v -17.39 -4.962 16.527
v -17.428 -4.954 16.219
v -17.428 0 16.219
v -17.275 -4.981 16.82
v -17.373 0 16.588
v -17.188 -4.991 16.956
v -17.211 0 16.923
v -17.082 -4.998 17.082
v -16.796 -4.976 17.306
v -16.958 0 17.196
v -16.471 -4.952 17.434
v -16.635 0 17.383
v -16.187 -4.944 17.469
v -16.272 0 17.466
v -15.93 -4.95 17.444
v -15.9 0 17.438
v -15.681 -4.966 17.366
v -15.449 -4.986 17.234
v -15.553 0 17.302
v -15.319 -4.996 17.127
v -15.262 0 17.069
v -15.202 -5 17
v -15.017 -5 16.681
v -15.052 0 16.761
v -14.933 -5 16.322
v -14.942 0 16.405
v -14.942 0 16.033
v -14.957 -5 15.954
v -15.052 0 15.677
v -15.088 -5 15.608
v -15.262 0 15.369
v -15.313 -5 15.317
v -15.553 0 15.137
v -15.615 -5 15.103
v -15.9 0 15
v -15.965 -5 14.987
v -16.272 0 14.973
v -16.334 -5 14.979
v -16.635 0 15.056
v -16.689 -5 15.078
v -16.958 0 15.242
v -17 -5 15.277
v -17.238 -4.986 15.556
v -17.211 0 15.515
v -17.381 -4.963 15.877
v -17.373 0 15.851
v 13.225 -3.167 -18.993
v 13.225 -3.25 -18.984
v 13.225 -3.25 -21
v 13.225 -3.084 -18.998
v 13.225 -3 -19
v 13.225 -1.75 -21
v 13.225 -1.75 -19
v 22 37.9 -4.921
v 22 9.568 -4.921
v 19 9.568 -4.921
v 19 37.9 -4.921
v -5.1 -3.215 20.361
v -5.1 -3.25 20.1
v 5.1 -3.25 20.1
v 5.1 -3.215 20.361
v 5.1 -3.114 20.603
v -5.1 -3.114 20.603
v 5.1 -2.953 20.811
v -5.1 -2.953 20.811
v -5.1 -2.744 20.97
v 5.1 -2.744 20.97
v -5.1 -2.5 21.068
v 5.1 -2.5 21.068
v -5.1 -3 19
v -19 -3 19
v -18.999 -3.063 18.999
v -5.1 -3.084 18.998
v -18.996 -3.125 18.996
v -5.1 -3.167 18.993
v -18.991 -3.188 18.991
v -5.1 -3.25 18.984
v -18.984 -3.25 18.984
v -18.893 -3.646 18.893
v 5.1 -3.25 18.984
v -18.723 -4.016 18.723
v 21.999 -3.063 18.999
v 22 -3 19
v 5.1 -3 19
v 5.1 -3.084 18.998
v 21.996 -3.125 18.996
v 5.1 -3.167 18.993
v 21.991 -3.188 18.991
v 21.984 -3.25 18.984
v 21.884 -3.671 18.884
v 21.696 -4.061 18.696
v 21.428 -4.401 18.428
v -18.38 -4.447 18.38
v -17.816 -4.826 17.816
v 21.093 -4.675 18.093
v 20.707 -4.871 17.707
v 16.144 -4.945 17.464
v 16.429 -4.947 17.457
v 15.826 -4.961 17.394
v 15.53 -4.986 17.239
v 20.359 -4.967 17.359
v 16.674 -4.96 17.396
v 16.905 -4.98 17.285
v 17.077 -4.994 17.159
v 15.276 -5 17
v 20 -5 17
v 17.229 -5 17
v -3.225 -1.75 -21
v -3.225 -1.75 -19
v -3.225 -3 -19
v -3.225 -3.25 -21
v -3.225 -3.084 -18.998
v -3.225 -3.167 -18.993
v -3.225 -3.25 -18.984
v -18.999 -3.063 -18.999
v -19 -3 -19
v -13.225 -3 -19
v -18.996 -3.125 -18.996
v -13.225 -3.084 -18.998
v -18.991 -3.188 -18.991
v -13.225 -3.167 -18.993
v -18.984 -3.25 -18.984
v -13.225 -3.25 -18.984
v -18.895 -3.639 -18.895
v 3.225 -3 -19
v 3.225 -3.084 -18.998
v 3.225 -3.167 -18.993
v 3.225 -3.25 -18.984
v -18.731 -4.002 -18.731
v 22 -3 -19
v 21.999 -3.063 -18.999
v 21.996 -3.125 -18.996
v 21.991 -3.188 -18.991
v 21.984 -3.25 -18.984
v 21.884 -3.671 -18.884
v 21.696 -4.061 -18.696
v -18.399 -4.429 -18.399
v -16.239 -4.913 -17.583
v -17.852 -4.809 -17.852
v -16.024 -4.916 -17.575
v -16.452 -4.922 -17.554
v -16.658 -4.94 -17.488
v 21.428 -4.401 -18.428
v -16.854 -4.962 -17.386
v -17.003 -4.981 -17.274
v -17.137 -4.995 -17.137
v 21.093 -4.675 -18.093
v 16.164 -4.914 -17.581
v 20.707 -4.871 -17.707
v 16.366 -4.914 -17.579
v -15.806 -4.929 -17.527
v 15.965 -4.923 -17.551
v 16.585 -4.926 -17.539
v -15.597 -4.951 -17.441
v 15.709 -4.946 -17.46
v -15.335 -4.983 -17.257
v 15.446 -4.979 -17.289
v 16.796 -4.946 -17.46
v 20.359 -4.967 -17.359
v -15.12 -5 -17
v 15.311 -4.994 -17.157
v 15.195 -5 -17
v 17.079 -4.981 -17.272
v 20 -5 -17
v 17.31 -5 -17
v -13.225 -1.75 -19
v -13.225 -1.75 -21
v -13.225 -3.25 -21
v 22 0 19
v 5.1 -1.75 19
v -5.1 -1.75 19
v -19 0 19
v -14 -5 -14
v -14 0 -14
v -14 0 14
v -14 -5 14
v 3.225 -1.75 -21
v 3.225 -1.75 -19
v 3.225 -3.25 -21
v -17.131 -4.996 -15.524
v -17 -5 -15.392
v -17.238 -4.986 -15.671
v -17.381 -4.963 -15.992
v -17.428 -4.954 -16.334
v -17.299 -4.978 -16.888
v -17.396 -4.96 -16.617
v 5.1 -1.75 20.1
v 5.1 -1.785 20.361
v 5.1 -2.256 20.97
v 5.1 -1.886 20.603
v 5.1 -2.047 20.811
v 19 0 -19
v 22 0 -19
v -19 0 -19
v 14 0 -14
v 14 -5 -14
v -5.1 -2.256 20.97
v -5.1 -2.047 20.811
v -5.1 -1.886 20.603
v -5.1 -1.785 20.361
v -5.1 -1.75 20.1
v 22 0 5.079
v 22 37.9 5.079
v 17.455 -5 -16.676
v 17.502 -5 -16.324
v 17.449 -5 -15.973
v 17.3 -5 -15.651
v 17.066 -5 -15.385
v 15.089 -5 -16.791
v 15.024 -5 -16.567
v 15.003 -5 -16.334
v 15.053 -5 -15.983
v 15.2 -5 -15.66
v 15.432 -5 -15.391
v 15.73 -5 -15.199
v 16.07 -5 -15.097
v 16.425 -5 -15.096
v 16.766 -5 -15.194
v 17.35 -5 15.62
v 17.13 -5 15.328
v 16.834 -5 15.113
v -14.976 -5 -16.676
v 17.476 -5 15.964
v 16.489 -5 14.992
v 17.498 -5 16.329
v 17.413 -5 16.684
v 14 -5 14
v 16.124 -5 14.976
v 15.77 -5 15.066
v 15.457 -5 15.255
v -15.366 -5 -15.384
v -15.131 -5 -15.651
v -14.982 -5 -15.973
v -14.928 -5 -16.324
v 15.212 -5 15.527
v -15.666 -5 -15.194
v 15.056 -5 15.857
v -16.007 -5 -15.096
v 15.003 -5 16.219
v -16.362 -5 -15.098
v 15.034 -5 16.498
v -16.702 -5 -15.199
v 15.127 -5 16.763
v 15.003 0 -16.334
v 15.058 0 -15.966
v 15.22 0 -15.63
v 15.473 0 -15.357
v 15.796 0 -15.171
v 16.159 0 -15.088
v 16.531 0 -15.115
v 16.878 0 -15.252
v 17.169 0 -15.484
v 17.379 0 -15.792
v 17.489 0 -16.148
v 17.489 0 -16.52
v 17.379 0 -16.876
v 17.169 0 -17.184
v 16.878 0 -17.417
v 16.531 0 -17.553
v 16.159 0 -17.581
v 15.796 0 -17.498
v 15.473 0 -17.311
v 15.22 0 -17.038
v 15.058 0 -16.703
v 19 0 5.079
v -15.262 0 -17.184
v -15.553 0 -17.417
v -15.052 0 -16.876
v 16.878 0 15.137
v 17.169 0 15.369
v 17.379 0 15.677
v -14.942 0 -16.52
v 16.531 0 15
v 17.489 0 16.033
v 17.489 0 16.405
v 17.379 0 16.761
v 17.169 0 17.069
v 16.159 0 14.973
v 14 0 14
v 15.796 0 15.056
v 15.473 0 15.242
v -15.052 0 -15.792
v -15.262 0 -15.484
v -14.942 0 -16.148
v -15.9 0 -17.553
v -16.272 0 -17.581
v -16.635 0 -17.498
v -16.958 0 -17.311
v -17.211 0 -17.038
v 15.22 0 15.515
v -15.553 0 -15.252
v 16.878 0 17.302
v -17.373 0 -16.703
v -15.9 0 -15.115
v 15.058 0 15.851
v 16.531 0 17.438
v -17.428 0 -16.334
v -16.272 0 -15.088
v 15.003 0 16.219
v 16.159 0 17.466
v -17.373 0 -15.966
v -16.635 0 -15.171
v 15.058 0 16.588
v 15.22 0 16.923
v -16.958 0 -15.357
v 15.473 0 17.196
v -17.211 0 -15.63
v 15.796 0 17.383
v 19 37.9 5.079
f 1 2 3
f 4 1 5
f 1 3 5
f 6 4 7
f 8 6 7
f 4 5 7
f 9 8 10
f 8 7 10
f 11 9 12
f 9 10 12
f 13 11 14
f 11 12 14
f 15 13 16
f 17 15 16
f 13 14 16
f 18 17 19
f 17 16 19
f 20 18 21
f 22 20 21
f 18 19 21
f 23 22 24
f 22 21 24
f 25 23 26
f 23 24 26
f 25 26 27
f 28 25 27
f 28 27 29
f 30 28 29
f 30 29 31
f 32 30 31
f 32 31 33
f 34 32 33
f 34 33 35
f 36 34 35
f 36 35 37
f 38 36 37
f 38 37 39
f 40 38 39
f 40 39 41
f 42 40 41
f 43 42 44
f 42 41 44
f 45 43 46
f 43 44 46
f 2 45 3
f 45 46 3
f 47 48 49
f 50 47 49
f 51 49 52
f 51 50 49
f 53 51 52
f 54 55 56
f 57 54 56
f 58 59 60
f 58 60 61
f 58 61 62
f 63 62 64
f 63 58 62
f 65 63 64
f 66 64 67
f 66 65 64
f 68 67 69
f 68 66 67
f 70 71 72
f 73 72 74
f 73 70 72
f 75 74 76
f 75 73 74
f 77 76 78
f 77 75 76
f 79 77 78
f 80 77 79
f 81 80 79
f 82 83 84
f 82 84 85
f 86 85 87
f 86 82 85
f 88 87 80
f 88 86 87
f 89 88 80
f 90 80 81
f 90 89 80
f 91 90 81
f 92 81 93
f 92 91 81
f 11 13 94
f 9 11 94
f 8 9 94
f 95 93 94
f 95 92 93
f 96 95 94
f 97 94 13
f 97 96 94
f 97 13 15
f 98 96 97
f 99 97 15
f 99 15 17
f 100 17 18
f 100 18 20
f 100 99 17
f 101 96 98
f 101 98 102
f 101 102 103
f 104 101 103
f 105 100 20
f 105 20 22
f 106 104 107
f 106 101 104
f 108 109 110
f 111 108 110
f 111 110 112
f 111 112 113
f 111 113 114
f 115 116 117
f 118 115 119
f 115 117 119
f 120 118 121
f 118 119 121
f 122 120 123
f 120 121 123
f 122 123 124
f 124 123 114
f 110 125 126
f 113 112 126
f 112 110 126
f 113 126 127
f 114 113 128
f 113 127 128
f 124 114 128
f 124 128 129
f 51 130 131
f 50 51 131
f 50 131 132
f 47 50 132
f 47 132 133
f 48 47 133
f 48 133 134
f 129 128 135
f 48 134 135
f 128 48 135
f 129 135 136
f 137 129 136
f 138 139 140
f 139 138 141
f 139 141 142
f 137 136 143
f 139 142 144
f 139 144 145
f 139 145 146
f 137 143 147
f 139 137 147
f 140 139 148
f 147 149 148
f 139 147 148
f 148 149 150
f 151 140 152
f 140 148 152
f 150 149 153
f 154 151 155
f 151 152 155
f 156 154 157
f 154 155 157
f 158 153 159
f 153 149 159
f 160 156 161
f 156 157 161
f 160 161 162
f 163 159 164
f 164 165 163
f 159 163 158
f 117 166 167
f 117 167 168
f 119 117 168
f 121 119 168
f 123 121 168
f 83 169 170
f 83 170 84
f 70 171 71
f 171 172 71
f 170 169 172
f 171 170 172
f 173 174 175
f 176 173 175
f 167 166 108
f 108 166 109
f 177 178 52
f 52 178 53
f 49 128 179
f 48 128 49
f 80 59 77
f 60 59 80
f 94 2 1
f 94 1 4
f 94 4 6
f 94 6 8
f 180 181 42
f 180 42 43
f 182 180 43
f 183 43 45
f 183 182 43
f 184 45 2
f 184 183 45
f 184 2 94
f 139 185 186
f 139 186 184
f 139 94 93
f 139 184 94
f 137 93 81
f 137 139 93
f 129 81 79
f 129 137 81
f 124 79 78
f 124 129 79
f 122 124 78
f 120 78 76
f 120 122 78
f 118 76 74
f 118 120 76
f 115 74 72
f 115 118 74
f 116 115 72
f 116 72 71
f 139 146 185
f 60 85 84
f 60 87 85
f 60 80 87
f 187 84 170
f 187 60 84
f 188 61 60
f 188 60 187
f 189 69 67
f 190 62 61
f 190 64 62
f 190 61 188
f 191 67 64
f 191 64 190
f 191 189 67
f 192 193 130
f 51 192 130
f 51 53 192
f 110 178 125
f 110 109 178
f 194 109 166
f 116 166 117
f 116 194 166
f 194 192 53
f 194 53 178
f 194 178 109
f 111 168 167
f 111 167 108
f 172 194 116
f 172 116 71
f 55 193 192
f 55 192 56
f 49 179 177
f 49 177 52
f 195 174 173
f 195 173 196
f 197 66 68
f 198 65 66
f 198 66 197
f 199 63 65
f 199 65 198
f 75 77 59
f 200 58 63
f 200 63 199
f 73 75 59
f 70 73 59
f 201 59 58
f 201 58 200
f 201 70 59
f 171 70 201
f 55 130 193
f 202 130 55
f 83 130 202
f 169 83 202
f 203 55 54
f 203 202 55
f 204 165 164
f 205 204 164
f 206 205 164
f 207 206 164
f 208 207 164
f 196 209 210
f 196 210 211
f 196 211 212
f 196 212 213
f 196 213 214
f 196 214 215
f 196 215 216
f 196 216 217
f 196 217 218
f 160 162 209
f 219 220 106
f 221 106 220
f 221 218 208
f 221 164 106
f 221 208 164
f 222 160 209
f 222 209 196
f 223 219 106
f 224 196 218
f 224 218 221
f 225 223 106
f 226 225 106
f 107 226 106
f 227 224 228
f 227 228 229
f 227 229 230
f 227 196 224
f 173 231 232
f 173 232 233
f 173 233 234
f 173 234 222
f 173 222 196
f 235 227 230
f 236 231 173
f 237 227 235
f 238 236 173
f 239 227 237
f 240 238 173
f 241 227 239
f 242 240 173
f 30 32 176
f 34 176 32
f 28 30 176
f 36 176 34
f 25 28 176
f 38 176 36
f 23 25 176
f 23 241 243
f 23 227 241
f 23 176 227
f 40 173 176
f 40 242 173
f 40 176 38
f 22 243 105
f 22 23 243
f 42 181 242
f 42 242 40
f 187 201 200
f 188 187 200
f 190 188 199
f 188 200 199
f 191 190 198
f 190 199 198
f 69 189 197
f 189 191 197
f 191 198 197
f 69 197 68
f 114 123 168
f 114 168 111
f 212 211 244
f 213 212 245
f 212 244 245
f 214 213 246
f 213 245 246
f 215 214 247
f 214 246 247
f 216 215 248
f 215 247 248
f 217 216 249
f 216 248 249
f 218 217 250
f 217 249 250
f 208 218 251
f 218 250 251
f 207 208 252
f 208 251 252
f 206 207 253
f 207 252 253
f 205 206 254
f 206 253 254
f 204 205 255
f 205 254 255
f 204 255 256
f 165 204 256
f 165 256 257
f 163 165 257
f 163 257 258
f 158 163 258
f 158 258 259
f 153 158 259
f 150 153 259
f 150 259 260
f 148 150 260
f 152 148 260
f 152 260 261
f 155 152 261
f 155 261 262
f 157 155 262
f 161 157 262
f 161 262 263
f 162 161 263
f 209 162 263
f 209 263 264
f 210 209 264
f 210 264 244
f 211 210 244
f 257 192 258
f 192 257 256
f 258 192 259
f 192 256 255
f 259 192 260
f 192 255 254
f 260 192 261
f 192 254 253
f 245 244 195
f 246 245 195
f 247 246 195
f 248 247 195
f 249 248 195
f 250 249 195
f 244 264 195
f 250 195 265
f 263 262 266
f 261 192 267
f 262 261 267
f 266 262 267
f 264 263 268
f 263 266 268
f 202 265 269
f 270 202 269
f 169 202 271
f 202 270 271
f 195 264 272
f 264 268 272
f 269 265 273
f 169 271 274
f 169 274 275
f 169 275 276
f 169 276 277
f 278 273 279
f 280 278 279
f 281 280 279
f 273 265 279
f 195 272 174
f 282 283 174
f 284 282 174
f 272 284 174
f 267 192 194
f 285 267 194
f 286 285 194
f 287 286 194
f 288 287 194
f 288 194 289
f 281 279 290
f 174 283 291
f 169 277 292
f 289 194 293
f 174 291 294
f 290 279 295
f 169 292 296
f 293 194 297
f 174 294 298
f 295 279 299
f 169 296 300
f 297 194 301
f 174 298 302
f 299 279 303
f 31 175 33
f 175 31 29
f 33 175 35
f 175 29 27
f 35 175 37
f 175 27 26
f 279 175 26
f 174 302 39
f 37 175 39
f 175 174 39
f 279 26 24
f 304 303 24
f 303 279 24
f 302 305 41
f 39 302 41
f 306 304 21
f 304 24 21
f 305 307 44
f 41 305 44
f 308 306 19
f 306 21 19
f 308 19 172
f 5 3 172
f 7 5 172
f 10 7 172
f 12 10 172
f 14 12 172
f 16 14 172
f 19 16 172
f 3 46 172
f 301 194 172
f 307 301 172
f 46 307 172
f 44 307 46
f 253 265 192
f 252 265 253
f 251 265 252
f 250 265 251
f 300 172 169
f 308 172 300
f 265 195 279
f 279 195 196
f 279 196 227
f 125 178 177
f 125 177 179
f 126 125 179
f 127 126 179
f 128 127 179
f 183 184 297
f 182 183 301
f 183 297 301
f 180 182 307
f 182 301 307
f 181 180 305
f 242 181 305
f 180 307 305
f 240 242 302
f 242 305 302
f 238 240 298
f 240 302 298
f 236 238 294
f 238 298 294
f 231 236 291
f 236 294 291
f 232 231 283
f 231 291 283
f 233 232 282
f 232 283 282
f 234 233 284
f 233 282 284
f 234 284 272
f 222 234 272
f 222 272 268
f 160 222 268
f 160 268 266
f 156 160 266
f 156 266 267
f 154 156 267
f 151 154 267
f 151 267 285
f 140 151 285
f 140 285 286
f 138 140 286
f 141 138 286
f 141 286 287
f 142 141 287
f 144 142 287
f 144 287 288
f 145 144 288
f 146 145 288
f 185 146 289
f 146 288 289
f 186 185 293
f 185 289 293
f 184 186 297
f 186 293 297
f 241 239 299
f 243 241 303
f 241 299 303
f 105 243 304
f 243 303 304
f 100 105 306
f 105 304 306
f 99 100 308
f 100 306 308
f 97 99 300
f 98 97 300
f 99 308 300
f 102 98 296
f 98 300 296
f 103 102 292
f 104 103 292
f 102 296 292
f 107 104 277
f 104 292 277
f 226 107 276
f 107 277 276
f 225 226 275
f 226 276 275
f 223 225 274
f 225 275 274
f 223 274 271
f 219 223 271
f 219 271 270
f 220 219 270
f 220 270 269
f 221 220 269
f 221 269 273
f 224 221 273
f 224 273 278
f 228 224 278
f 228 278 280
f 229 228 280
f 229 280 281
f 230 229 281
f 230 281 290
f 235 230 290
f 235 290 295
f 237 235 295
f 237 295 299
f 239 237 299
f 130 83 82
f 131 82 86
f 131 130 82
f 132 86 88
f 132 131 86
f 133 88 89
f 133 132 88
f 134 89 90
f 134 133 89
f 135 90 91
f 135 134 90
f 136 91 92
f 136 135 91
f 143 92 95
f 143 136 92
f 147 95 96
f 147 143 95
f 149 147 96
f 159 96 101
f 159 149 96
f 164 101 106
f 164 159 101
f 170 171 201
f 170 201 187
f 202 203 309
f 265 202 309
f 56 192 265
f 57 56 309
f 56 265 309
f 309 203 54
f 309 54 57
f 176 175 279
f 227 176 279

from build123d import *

# Parameters (mm, degrees)
F0_W          = 38
F0_H          = 38
F0_W_2        = 28
F0_H_2        = 28
F1_DEPTH      = 5
F2_W          = 10.2
F2_H          = 1.5
F3_DEPTH      = 2.1
F4_T1_DEPTH   = 15.2
F5_W          = 10
F5_H          = 1.5
F6_DEPTH      = 2
F8_D          = 2.5
F9_DEPTH      = 3
F10_W         = 3
F10_H         = 10
F11_DEPTH     = 37.9
F13_DEPTH     = 3
F14_T1_DEPTH  = 48
F14_T6_DEPTH  = 51
F14_T11_DEPTH = 51
F14_T16_DEPTH = 51
F14_T21_DEPTH = 51
F14_T26_DEPTH = 51
F14_T31_DEPTH = 51
F14_T37_DEPTH = 51


# Not quite as in the source:
# - a fillet or chamfer that OpenCascade refuses, or shapes differently, is made with other operations: its cross-section is extruded or revolved along the edge and cut away or added


with BuildPart() as f1:
    # F0 (on Front) → F1 (new body)
    with BuildSketch(Plane.XZ):
        Rectangle(F0_W, F0_H)
        Rectangle(F0_W_2, F0_H_2, mode=Mode.SUBTRACT)
    extrude(amount=F1_DEPTH)

    # F2 (on face) → F3 (join)
    with BuildSketch(Plane.XY.offset(19)):
        with Locations((0, -2.5)):
            Rectangle(F2_W, F2_H)
    extrude(amount=F3_DEPTH)

    # F4: fillet of radius 1 on 2 edges, made by hand

    # F4_s2 → F4_t1 (cut)
    with BuildSketch(Plane.YZ.offset(-7.6)):
        with BuildLine():
            ThreePointArc((-3.25, 20.1), (-2.9571067812, 20.8071067812), (-2.25, 21.1))
            Line((-2.25, 21.1), (-3.25, 21.1))
            Line((-3.25, 21.1), (-3.25, 20.1))
        make_face()
        with BuildLine():
            ThreePointArc((-1.75, 20.1), (-2.0428932188, 20.8071067812), (-2.75, 21.1))
            Line((-2.75, 21.1), (-1.75, 21.1))
            Line((-1.75, 21.1), (-1.75, 20.1))
        make_face()
    extrude(amount=F4_T1_DEPTH, mode=Mode.SUBTRACT)

    # F5 (on face) → F6 (join)
    with BuildSketch(Plane(origin=(0, 0, -19), x_dir=(1, 0, 0), z_dir=(0, 0, -1))):
        with Locations((-8.225, 2.5)):
            Rectangle(F5_W, F5_H)
        with Locations((8.225, 2.5)):
            Rectangle(F5_W, F5_H)
    extrude(amount=F6_DEPTH)

    # F8 (through all)
    with Locations(Plane.XZ.offset(5)):
        with Locations((16.2525195628, 16.2191219109), (-16.1783080548, 16.2191219109), (-16.1783080548, -16.3340959698), (16.2525195628, -16.3340959698)):
            Hole(F8_D / 2)

    # F9 (add): a face of the model
    f9_faces = [f1.faces().sort_by_distance(p)[0] for p in [
        (19, -2.5, 0),
    ]]
    extrude(f9_faces, amount=F9_DEPTH)

    # F10 (on face) → F11 (join)
    with BuildSketch(Plane(origin=(0, 0, 0), x_dir=(-1, 0, 0), z_dir=(0, 1, 0))):
        with Locations((-20.5, 0.0792577478)):
            Rectangle(F10_W, F10_H)
    extrude(amount=F11_DEPTH)

    # F12 (on face) → F13 (join, through all)
    with BuildSketch(Plane.YZ.offset(22)):
        Polygon((0, -4.9207422522), (0, -19), (9.5675168559, -4.9207422522), align=None)
    extrude(amount=-F13_DEPTH)

    # F14: fillet of radius 2 on 4 edges, made by hand

    # F14_s2 → F14_t1 (cut)
    with BuildSketch(Plane.XY.offset(-24)):
        with BuildLine():
            ThreePointArc((22, -3), (21.4142135624, -4.4142135624), (20, -5))
            Line((20, -5), (22, -5))
            Line((22, -5), (22, -3))
        make_face()
        with BuildLine():
            ThreePointArc((-17, -5), (-18.4142135624, -4.4142135624), (-19, -3))
            Line((-19, -3), (-19, -5))
            Line((-19, -5), (-17, -5))
        make_face()
    extrude(amount=F14_T1_DEPTH, mode=Mode.SUBTRACT)


with BuildPart() as f14_tool4:
    # F14_s5 → F14_t6 (new body)
    with BuildSketch(Plane.YZ.offset(27)):
        with BuildLine():
            ThreePointArc((-3, 19), (-4.4142135624, 18.4142135624), (-5, 17))
            Line((-5, 17), (-5, 19))
            Line((-5, 19), (-3, 19))
        make_face()
    extrude(amount=-F14_T6_DEPTH)

    split(bisect_by=Plane.YZ.offset(5.1), keep=Keep.TOP)


with BuildPart() as f1_1:
    add(f1.part)

    # F14_t3: cut F14_tool4
    add(f14_tool4.part, mode=Mode.SUBTRACT)


with BuildPart() as f14_tool9:
    # F14_s10 → F14_t11 (new body)
    with BuildSketch(Plane.YZ.offset(27)):
        with BuildLine():
            ThreePointArc((-3, 19), (-4.4142135624, 18.4142135624), (-5, 17))
            Line((-5, 17), (-5, 19))
            Line((-5, 19), (-3, 19))
        make_face()
    extrude(amount=-F14_T11_DEPTH)

    split(bisect_by=Plane.XZ.offset(3.25), keep=Keep.TOP)


with BuildPart() as f1_2:
    add(f1_1.part)

    # F14_t8: cut F14_tool9
    add(f14_tool9.part, mode=Mode.SUBTRACT)


with BuildPart() as f14_tool14:
    # F14_s15 → F14_t16 (new body)
    with BuildSketch(Plane.YZ.offset(27)):
        with BuildLine():
            ThreePointArc((-3, 19), (-4.4142135624, 18.4142135624), (-5, 17))
            Line((-5, 17), (-5, 19))
            Line((-5, 19), (-3, 19))
        make_face()
    extrude(amount=-F14_T16_DEPTH)

    split(bisect_by=Plane.YZ.offset(-5.1), keep=Keep.BOTTOM)


with BuildPart() as f1_3:
    add(f1_2.part)

    # F14_t13: cut F14_tool14
    add(f14_tool14.part, mode=Mode.SUBTRACT)


with BuildPart() as f14_tool19:
    # F14_s20 → F14_t21 (new body)
    with BuildSketch(Plane.YZ.offset(27)):
        with BuildLine():
            ThreePointArc((-3, -19), (-4.4142135624, -18.4142135624), (-5, -17))
            Line((-5, -17), (-5, -19))
            Line((-5, -19), (-3, -19))
        make_face()
    extrude(amount=-F14_T21_DEPTH)

    split(bisect_by=Plane.YZ.offset(13.225), keep=Keep.TOP)


with BuildPart() as f1_4:
    add(f1_3.part)

    # F14_t18: cut F14_tool19
    add(f14_tool19.part, mode=Mode.SUBTRACT)


with BuildPart() as f14_tool24:
    # F14_s25 → F14_t26 (new body)
    with BuildSketch(Plane.YZ.offset(27)):
        with BuildLine():
            ThreePointArc((-3, -19), (-4.4142135624, -18.4142135624), (-5, -17))
            Line((-5, -17), (-5, -19))
            Line((-5, -19), (-3, -19))
        make_face()
    extrude(amount=-F14_T26_DEPTH)

    split(bisect_by=Plane.XZ.offset(3.25), keep=Keep.TOP)


with BuildPart() as f1_5:
    add(f1_4.part)

    # F14_t23: cut F14_tool24
    add(f14_tool24.part, mode=Mode.SUBTRACT)


with BuildPart() as f14_tool29:
    # F14_s30 → F14_t31 (new body)
    with BuildSketch(Plane.YZ.offset(27)):
        with BuildLine():
            ThreePointArc((-3, -19), (-4.4142135624, -18.4142135624), (-5, -17))
            Line((-5, -17), (-5, -19))
            Line((-5, -19), (-3, -19))
        make_face()
    extrude(amount=-F14_T31_DEPTH)

    split(bisect_by=Plane.YZ.offset(3.225), keep=Keep.BOTTOM)

    split(bisect_by=Plane.YZ.offset(-3.225), keep=Keep.TOP)


with BuildPart() as f1_6:
    add(f1_5.part)

    # F14_t28: cut F14_tool29
    add(f14_tool29.part, mode=Mode.SUBTRACT)


with BuildPart() as f14_tool35:
    # F14_s36 → F14_t37 (new body)
    with BuildSketch(Plane.YZ.offset(27)):
        with BuildLine():
            ThreePointArc((-3, -19), (-4.4142135624, -18.4142135624), (-5, -17))
            Line((-5, -17), (-5, -19))
            Line((-5, -19), (-3, -19))
        make_face()
    extrude(amount=-F14_T37_DEPTH)

    split(bisect_by=Plane.YZ.offset(-13.225), keep=Keep.BOTTOM)


with BuildPart() as f1_7:
    add(f1_6.part)

    # F14_t34: cut F14_tool35
    add(f14_tool35.part, mode=Mode.SUBTRACT)


solid = f1_7.part
